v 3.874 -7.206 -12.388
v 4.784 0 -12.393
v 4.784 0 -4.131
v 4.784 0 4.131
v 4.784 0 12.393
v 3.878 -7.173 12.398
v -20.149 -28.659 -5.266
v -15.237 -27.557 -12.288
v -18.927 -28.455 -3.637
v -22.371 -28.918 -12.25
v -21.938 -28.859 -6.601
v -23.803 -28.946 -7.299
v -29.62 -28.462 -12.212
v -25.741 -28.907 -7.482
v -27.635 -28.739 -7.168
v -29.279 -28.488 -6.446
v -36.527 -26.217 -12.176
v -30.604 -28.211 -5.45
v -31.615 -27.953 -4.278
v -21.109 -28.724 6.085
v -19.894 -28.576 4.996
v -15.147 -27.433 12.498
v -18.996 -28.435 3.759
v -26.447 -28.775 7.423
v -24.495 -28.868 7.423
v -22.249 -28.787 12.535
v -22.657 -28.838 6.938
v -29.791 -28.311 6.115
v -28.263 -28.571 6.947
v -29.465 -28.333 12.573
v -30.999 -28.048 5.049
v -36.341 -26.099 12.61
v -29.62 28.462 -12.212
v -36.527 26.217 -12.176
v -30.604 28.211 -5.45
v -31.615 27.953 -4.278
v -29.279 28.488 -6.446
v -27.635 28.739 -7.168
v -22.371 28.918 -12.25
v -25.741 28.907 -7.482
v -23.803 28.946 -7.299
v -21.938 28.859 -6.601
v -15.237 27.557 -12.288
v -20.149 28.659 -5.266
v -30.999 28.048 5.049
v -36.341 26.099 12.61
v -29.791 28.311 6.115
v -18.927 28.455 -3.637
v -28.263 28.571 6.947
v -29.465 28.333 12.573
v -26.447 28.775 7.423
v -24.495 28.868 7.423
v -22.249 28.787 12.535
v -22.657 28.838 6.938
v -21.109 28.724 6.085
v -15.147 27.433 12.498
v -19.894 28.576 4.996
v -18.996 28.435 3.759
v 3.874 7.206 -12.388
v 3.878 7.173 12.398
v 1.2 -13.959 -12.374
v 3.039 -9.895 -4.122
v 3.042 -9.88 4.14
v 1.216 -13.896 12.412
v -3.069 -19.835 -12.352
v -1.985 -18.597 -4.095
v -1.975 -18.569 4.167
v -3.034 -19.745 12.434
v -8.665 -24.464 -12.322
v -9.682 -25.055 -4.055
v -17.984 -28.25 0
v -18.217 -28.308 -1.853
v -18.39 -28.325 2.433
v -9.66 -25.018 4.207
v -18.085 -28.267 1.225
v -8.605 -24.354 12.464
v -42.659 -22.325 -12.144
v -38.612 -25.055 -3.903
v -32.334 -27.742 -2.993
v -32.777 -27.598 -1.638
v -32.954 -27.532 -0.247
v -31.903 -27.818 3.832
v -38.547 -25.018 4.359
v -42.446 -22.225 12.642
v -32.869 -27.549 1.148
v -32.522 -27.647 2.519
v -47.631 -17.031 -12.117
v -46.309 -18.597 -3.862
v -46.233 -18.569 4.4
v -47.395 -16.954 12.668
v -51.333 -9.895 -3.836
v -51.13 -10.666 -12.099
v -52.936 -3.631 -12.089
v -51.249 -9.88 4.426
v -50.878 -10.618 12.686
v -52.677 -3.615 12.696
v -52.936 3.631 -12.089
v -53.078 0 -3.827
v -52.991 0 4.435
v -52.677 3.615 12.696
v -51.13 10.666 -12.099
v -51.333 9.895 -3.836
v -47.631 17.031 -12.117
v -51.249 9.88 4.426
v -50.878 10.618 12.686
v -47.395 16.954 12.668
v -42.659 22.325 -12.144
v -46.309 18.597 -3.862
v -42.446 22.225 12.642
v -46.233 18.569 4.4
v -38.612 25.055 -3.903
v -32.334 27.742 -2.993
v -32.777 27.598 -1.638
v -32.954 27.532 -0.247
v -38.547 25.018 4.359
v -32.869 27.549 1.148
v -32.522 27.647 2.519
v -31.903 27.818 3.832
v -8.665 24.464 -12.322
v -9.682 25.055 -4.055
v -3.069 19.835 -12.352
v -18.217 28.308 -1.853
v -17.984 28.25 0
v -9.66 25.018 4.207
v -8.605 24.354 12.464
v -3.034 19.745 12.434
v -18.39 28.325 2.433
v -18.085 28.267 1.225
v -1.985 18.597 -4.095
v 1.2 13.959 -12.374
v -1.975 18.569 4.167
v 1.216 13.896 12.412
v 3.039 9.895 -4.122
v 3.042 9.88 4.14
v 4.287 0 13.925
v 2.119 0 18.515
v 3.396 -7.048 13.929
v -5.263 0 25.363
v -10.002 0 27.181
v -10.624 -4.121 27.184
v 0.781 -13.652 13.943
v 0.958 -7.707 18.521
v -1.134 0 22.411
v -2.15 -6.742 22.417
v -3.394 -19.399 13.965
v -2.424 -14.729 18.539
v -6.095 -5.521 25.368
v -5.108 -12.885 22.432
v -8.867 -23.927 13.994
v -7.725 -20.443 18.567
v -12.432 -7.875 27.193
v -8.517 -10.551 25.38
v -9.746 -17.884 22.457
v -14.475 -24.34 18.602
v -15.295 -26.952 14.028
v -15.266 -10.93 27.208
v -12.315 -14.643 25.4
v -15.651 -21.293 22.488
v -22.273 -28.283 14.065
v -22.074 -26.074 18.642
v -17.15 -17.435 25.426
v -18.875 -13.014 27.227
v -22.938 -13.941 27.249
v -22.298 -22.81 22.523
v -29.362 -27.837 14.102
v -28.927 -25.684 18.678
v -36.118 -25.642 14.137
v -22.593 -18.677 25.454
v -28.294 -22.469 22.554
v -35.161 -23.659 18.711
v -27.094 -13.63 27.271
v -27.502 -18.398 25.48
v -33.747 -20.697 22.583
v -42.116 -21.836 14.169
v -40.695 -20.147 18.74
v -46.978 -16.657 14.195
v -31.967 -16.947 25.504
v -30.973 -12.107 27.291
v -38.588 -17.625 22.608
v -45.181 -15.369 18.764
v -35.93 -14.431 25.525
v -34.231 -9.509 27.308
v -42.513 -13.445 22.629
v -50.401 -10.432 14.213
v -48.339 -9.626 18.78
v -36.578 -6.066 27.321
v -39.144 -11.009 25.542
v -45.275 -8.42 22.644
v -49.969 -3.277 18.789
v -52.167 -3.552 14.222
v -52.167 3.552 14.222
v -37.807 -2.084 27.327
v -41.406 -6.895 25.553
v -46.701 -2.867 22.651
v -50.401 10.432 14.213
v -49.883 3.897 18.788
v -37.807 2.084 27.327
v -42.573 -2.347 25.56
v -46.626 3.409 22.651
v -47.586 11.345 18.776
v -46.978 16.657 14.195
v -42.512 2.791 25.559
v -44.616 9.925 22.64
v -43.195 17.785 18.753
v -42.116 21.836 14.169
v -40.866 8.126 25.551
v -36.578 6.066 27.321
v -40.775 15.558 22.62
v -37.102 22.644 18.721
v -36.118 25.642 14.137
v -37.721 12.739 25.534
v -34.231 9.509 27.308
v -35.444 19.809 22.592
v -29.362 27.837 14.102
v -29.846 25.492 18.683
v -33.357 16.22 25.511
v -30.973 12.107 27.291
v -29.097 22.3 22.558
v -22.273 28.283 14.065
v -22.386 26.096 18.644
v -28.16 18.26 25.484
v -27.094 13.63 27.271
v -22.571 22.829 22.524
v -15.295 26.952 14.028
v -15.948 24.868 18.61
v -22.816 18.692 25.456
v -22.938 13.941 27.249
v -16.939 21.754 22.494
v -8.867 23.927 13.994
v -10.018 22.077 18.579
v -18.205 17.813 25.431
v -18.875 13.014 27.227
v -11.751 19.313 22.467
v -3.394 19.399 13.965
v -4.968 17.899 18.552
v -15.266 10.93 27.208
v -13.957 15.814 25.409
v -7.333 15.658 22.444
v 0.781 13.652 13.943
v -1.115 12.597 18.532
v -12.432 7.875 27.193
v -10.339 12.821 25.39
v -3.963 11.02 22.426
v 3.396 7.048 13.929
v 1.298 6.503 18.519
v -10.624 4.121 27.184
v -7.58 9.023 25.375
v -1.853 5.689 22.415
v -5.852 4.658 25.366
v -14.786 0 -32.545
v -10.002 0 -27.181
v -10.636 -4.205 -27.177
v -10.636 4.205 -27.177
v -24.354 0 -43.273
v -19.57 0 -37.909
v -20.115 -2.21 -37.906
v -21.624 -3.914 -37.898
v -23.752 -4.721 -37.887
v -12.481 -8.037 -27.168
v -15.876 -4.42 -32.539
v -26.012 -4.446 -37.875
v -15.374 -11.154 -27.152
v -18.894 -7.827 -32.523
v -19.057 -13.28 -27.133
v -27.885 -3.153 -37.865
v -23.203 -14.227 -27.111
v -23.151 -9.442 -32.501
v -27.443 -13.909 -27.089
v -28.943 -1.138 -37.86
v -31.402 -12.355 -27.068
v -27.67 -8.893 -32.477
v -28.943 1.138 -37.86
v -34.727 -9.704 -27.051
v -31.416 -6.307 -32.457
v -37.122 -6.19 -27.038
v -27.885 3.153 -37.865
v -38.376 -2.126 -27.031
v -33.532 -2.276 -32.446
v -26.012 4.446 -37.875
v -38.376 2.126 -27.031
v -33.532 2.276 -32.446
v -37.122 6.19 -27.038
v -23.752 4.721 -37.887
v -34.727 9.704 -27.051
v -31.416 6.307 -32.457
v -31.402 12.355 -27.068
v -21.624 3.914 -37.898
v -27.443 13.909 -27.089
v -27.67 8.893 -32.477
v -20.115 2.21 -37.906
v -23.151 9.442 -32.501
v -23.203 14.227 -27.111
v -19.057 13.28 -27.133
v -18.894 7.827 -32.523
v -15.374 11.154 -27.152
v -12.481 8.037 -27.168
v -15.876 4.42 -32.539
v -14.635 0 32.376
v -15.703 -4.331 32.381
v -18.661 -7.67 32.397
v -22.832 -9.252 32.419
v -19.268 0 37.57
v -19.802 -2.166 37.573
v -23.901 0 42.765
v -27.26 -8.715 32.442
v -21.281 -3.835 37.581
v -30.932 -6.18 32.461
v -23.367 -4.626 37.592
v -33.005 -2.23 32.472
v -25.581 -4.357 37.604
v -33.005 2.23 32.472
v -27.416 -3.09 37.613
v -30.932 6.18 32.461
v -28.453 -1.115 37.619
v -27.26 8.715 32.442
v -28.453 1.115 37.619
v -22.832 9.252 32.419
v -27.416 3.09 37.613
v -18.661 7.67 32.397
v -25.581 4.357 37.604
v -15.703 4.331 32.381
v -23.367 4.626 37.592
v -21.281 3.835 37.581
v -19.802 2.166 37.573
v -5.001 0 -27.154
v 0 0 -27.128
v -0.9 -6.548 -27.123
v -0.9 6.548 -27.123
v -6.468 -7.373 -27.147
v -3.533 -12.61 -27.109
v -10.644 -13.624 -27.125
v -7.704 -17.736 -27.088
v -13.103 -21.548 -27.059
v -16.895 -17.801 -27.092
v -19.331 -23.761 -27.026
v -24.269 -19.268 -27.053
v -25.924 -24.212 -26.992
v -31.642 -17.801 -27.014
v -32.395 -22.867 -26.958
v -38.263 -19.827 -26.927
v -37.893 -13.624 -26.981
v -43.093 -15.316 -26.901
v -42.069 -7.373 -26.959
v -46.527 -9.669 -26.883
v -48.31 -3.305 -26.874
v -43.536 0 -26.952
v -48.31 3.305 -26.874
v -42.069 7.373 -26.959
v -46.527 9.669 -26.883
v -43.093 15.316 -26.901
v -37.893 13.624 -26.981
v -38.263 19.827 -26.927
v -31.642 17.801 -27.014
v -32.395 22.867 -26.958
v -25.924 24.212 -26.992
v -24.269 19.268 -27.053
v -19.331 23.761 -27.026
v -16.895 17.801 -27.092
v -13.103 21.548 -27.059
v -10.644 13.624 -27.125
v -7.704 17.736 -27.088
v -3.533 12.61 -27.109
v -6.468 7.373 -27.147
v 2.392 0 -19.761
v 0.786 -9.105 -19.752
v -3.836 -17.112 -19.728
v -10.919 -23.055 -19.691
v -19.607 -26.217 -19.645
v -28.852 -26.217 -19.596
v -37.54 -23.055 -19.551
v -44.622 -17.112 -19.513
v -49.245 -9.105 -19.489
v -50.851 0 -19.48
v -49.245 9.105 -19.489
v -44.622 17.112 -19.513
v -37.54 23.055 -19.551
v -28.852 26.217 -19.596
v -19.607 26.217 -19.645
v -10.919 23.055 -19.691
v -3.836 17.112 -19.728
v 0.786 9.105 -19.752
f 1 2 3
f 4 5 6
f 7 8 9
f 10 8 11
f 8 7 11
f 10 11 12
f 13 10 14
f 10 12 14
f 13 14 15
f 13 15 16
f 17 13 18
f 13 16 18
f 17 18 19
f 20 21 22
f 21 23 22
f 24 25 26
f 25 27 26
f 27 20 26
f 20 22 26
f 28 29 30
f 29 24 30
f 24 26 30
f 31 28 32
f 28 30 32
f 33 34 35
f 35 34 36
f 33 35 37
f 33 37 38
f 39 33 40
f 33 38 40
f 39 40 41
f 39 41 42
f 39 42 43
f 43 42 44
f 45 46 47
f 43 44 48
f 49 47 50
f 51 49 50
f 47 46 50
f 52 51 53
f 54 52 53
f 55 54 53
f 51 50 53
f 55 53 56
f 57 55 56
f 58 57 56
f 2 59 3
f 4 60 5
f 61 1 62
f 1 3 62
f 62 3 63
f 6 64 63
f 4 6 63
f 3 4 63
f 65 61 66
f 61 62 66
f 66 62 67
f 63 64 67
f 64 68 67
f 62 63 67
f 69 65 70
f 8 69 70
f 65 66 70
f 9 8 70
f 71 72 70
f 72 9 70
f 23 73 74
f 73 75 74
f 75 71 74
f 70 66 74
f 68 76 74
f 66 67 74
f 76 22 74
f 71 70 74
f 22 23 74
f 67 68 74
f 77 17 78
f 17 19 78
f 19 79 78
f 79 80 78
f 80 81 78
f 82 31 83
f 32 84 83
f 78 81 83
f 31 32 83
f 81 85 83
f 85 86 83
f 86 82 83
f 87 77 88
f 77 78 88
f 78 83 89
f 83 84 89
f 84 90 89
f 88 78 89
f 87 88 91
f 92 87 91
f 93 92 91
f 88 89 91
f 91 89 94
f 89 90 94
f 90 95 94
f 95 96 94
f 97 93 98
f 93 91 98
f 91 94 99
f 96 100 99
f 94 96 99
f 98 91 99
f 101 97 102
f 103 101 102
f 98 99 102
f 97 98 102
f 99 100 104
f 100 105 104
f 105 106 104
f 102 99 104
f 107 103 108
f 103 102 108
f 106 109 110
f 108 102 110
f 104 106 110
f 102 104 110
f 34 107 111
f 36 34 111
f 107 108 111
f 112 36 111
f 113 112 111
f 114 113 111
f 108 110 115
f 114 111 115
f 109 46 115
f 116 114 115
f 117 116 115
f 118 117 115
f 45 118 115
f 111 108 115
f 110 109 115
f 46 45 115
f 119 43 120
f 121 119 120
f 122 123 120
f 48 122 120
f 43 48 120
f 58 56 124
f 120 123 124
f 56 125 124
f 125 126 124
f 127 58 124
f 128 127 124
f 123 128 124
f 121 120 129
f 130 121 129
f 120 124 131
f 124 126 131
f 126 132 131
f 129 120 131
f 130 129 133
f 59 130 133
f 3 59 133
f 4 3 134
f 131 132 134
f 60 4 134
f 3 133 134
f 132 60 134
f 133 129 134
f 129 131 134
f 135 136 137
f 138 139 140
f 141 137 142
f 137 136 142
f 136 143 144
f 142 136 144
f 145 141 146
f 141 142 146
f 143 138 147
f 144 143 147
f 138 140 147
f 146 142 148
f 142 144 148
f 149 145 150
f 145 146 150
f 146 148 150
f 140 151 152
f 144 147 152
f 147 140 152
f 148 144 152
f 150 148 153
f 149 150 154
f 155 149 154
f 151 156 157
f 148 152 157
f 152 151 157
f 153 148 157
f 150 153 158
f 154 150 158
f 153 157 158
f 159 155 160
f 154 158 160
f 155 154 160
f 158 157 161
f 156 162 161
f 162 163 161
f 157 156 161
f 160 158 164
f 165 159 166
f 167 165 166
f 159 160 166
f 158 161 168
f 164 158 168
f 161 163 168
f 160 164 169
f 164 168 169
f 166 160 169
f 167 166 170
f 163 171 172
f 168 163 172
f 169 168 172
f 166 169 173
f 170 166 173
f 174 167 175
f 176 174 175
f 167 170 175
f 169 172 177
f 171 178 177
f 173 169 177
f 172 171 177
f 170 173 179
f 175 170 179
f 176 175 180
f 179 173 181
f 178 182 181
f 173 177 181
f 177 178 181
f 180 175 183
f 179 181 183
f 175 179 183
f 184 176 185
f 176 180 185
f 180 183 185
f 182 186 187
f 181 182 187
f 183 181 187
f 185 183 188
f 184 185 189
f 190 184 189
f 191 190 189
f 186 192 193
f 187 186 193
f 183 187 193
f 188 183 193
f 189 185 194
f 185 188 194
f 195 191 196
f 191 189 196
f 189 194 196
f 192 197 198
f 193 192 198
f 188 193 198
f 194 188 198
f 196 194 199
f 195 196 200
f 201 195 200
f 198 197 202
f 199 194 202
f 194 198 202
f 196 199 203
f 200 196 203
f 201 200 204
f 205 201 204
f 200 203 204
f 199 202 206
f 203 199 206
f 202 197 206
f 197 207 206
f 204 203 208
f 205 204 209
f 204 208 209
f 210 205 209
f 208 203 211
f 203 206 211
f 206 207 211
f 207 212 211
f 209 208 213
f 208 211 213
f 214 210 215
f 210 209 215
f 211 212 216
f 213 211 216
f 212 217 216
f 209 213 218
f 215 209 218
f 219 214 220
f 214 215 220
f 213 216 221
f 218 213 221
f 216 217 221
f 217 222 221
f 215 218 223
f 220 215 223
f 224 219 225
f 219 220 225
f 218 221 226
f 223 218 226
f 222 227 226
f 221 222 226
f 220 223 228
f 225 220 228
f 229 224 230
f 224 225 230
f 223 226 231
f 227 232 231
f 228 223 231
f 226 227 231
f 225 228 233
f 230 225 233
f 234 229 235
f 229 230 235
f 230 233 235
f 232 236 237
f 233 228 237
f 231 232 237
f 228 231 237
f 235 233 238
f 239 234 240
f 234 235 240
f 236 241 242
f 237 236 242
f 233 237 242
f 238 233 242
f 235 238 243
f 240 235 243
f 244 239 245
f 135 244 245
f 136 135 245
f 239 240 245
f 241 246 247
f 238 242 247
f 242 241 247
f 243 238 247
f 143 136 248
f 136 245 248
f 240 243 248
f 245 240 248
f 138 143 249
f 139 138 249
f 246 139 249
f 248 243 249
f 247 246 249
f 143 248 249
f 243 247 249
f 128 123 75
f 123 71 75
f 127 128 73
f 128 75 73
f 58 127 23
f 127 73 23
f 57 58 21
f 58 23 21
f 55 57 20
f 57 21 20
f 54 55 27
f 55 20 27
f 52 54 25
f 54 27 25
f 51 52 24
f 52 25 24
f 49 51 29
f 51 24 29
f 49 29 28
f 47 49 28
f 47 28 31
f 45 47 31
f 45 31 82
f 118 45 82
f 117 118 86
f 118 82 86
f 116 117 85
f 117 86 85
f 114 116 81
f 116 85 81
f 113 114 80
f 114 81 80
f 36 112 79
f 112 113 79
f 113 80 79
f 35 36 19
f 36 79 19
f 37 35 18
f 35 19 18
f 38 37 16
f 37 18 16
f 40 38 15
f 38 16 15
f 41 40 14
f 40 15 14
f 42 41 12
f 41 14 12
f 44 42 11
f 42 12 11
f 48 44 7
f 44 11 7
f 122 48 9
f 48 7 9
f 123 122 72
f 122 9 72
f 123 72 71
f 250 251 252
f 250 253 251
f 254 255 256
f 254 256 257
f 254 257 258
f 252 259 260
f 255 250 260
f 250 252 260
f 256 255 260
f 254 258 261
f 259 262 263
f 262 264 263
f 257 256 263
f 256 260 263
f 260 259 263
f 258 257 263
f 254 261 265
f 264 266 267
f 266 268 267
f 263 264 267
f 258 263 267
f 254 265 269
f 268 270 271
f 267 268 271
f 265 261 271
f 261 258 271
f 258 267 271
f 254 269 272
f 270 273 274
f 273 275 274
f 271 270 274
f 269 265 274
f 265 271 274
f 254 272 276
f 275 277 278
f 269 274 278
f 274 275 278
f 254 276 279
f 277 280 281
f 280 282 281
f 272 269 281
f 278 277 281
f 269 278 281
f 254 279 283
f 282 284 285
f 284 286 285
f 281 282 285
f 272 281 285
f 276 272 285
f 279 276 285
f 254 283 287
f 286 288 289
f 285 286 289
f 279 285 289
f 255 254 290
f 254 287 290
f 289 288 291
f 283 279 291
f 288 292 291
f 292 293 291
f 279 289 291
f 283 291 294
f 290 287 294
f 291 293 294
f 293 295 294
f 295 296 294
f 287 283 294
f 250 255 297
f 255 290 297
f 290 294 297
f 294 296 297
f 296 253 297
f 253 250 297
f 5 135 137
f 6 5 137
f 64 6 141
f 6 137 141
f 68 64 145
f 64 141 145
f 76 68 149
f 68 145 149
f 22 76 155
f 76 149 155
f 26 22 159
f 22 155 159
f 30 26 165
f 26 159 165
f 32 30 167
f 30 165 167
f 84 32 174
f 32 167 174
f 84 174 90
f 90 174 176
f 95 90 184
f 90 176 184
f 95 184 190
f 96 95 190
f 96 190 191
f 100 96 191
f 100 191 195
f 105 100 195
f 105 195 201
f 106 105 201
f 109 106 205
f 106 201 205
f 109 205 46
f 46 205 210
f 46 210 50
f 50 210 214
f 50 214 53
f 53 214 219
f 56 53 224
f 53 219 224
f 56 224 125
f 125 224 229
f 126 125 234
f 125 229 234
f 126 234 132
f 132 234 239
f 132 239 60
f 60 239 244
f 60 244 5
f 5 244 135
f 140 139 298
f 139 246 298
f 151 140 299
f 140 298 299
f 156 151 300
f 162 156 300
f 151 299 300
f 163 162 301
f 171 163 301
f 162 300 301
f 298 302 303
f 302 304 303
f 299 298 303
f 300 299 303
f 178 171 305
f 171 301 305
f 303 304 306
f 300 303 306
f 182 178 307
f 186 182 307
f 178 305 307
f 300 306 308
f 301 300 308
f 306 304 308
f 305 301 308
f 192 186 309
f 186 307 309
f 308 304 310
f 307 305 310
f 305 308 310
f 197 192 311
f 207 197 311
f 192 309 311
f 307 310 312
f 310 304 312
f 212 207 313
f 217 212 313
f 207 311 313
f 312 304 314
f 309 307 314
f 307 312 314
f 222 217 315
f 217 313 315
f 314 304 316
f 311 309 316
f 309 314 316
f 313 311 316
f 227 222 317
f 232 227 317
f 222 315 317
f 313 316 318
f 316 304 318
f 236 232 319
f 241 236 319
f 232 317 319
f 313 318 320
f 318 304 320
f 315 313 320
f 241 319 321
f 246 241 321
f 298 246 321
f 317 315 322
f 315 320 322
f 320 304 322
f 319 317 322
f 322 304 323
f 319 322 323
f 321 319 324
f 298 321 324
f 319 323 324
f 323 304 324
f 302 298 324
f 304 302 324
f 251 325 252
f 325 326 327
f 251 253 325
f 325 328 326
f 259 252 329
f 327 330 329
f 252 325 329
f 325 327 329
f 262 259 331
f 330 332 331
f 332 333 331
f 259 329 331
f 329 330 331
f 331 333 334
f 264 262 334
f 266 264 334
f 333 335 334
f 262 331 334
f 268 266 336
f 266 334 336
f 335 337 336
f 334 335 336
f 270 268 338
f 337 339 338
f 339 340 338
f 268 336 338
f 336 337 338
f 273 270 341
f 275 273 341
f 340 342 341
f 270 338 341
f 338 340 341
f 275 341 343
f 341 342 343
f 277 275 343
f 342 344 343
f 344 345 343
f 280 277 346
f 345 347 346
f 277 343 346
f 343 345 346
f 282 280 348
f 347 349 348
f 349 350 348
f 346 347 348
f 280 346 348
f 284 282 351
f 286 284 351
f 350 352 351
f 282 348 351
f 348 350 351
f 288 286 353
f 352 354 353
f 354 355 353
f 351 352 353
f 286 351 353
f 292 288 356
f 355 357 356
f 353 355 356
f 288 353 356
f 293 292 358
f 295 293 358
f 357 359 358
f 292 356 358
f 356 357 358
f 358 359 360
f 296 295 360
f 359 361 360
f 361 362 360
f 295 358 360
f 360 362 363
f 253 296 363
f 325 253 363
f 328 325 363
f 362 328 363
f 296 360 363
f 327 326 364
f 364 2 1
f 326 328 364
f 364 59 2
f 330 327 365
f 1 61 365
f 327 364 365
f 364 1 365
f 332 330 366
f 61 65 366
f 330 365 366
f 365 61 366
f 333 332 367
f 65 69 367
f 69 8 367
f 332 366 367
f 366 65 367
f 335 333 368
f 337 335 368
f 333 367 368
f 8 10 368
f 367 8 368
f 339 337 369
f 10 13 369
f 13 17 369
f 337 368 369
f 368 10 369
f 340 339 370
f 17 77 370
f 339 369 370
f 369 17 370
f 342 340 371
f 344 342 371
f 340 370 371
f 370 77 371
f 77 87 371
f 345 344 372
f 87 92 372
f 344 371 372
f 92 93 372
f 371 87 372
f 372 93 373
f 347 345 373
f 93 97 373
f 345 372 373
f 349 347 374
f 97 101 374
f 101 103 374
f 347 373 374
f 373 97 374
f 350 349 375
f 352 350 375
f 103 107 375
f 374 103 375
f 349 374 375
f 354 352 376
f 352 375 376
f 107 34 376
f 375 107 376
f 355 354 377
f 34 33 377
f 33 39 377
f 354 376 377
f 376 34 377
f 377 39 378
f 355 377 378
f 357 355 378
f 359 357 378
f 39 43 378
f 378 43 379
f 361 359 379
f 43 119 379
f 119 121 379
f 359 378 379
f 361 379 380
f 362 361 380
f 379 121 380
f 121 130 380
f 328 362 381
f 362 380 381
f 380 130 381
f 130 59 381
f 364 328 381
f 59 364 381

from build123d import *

# Parameters (mm, degrees)
F2_R          = 7.4871337732
F3_DEPTH      = 38.4
F3_DEPTH_BACK = 28.9757450369


# Not quite as in the source:
# - a fillet or chamfer that OpenCascade refuses, or shapes differently, is made with other operations: its cross-section is extruded or revolved along the edge and cut away or added


with BuildPart() as f1:
    # F0 (on Front) → F1 (revolve)
    with BuildSketch(Plane.XZ):
        Polygon((-10.0024826825, 27.1807126701), (-23.9010660062, 42.7652467351), (-24.3538618088, -43.2729683816), (-10.0024826825, -27.1807126701), (0, -27.1280723152), (4.7837961465, -12.3932333663), (4.7837961465, 0), (4.7837961465, 12.3932333663), (0, 27.1280723152), align=None)
    revolve(axis=Axis((-24.1274639075, 0, -0.2538608233), (-0.005262656, 0, -0.9999861521)))

    # F2 (on Front) → F3 (cut, two sides)
    with BuildSketch(Plane.XZ) as f3_sk:
        with Locations((-25.4709236324, 0)):
            Circle(F2_R)
    extrude(amount=-F3_DEPTH, mode=Mode.SUBTRACT)
    extrude(f3_sk.sketch, amount=F3_DEPTH_BACK, mode=Mode.SUBTRACT)

    # F4: fillet of radius 20 on 1 edges, made by hand

    # F4_s1 → F4_t2 (revolve, cut)
    with BuildSketch(Plane.XZ):
        with BuildLine():
            ThreePointArc((4.2865600872, 13.9247980545), (-1.133885263, 22.4112009628), (-10.0024826825, 27.1807126701))
            Line((-10.0024826825, 27.1807126701), (-9.9078117783, 27.5693480003))
            ThreePointArc((-9.9078117783, 27.5693480003), (-4.9991362788, 27.5543869535), (0.0021050624, 27.5280667761))
            Line((0.0021050624, 27.5280667761), (0.3804517595, 27.2515893532))
            Line((0.3804517595, 27.2515893532), (4.6670118467, 14.0483150925))
            Line((4.6670118467, 14.0483150925), (4.2865600872, 13.9247980545))
        make_face()
    revolve(axis=Axis((-23.9826959839, 0, 27.2542867429), (-0.005262656, 0, -0.9999861521)), mode=Mode.SUBTRACT)


solid = f1.part
